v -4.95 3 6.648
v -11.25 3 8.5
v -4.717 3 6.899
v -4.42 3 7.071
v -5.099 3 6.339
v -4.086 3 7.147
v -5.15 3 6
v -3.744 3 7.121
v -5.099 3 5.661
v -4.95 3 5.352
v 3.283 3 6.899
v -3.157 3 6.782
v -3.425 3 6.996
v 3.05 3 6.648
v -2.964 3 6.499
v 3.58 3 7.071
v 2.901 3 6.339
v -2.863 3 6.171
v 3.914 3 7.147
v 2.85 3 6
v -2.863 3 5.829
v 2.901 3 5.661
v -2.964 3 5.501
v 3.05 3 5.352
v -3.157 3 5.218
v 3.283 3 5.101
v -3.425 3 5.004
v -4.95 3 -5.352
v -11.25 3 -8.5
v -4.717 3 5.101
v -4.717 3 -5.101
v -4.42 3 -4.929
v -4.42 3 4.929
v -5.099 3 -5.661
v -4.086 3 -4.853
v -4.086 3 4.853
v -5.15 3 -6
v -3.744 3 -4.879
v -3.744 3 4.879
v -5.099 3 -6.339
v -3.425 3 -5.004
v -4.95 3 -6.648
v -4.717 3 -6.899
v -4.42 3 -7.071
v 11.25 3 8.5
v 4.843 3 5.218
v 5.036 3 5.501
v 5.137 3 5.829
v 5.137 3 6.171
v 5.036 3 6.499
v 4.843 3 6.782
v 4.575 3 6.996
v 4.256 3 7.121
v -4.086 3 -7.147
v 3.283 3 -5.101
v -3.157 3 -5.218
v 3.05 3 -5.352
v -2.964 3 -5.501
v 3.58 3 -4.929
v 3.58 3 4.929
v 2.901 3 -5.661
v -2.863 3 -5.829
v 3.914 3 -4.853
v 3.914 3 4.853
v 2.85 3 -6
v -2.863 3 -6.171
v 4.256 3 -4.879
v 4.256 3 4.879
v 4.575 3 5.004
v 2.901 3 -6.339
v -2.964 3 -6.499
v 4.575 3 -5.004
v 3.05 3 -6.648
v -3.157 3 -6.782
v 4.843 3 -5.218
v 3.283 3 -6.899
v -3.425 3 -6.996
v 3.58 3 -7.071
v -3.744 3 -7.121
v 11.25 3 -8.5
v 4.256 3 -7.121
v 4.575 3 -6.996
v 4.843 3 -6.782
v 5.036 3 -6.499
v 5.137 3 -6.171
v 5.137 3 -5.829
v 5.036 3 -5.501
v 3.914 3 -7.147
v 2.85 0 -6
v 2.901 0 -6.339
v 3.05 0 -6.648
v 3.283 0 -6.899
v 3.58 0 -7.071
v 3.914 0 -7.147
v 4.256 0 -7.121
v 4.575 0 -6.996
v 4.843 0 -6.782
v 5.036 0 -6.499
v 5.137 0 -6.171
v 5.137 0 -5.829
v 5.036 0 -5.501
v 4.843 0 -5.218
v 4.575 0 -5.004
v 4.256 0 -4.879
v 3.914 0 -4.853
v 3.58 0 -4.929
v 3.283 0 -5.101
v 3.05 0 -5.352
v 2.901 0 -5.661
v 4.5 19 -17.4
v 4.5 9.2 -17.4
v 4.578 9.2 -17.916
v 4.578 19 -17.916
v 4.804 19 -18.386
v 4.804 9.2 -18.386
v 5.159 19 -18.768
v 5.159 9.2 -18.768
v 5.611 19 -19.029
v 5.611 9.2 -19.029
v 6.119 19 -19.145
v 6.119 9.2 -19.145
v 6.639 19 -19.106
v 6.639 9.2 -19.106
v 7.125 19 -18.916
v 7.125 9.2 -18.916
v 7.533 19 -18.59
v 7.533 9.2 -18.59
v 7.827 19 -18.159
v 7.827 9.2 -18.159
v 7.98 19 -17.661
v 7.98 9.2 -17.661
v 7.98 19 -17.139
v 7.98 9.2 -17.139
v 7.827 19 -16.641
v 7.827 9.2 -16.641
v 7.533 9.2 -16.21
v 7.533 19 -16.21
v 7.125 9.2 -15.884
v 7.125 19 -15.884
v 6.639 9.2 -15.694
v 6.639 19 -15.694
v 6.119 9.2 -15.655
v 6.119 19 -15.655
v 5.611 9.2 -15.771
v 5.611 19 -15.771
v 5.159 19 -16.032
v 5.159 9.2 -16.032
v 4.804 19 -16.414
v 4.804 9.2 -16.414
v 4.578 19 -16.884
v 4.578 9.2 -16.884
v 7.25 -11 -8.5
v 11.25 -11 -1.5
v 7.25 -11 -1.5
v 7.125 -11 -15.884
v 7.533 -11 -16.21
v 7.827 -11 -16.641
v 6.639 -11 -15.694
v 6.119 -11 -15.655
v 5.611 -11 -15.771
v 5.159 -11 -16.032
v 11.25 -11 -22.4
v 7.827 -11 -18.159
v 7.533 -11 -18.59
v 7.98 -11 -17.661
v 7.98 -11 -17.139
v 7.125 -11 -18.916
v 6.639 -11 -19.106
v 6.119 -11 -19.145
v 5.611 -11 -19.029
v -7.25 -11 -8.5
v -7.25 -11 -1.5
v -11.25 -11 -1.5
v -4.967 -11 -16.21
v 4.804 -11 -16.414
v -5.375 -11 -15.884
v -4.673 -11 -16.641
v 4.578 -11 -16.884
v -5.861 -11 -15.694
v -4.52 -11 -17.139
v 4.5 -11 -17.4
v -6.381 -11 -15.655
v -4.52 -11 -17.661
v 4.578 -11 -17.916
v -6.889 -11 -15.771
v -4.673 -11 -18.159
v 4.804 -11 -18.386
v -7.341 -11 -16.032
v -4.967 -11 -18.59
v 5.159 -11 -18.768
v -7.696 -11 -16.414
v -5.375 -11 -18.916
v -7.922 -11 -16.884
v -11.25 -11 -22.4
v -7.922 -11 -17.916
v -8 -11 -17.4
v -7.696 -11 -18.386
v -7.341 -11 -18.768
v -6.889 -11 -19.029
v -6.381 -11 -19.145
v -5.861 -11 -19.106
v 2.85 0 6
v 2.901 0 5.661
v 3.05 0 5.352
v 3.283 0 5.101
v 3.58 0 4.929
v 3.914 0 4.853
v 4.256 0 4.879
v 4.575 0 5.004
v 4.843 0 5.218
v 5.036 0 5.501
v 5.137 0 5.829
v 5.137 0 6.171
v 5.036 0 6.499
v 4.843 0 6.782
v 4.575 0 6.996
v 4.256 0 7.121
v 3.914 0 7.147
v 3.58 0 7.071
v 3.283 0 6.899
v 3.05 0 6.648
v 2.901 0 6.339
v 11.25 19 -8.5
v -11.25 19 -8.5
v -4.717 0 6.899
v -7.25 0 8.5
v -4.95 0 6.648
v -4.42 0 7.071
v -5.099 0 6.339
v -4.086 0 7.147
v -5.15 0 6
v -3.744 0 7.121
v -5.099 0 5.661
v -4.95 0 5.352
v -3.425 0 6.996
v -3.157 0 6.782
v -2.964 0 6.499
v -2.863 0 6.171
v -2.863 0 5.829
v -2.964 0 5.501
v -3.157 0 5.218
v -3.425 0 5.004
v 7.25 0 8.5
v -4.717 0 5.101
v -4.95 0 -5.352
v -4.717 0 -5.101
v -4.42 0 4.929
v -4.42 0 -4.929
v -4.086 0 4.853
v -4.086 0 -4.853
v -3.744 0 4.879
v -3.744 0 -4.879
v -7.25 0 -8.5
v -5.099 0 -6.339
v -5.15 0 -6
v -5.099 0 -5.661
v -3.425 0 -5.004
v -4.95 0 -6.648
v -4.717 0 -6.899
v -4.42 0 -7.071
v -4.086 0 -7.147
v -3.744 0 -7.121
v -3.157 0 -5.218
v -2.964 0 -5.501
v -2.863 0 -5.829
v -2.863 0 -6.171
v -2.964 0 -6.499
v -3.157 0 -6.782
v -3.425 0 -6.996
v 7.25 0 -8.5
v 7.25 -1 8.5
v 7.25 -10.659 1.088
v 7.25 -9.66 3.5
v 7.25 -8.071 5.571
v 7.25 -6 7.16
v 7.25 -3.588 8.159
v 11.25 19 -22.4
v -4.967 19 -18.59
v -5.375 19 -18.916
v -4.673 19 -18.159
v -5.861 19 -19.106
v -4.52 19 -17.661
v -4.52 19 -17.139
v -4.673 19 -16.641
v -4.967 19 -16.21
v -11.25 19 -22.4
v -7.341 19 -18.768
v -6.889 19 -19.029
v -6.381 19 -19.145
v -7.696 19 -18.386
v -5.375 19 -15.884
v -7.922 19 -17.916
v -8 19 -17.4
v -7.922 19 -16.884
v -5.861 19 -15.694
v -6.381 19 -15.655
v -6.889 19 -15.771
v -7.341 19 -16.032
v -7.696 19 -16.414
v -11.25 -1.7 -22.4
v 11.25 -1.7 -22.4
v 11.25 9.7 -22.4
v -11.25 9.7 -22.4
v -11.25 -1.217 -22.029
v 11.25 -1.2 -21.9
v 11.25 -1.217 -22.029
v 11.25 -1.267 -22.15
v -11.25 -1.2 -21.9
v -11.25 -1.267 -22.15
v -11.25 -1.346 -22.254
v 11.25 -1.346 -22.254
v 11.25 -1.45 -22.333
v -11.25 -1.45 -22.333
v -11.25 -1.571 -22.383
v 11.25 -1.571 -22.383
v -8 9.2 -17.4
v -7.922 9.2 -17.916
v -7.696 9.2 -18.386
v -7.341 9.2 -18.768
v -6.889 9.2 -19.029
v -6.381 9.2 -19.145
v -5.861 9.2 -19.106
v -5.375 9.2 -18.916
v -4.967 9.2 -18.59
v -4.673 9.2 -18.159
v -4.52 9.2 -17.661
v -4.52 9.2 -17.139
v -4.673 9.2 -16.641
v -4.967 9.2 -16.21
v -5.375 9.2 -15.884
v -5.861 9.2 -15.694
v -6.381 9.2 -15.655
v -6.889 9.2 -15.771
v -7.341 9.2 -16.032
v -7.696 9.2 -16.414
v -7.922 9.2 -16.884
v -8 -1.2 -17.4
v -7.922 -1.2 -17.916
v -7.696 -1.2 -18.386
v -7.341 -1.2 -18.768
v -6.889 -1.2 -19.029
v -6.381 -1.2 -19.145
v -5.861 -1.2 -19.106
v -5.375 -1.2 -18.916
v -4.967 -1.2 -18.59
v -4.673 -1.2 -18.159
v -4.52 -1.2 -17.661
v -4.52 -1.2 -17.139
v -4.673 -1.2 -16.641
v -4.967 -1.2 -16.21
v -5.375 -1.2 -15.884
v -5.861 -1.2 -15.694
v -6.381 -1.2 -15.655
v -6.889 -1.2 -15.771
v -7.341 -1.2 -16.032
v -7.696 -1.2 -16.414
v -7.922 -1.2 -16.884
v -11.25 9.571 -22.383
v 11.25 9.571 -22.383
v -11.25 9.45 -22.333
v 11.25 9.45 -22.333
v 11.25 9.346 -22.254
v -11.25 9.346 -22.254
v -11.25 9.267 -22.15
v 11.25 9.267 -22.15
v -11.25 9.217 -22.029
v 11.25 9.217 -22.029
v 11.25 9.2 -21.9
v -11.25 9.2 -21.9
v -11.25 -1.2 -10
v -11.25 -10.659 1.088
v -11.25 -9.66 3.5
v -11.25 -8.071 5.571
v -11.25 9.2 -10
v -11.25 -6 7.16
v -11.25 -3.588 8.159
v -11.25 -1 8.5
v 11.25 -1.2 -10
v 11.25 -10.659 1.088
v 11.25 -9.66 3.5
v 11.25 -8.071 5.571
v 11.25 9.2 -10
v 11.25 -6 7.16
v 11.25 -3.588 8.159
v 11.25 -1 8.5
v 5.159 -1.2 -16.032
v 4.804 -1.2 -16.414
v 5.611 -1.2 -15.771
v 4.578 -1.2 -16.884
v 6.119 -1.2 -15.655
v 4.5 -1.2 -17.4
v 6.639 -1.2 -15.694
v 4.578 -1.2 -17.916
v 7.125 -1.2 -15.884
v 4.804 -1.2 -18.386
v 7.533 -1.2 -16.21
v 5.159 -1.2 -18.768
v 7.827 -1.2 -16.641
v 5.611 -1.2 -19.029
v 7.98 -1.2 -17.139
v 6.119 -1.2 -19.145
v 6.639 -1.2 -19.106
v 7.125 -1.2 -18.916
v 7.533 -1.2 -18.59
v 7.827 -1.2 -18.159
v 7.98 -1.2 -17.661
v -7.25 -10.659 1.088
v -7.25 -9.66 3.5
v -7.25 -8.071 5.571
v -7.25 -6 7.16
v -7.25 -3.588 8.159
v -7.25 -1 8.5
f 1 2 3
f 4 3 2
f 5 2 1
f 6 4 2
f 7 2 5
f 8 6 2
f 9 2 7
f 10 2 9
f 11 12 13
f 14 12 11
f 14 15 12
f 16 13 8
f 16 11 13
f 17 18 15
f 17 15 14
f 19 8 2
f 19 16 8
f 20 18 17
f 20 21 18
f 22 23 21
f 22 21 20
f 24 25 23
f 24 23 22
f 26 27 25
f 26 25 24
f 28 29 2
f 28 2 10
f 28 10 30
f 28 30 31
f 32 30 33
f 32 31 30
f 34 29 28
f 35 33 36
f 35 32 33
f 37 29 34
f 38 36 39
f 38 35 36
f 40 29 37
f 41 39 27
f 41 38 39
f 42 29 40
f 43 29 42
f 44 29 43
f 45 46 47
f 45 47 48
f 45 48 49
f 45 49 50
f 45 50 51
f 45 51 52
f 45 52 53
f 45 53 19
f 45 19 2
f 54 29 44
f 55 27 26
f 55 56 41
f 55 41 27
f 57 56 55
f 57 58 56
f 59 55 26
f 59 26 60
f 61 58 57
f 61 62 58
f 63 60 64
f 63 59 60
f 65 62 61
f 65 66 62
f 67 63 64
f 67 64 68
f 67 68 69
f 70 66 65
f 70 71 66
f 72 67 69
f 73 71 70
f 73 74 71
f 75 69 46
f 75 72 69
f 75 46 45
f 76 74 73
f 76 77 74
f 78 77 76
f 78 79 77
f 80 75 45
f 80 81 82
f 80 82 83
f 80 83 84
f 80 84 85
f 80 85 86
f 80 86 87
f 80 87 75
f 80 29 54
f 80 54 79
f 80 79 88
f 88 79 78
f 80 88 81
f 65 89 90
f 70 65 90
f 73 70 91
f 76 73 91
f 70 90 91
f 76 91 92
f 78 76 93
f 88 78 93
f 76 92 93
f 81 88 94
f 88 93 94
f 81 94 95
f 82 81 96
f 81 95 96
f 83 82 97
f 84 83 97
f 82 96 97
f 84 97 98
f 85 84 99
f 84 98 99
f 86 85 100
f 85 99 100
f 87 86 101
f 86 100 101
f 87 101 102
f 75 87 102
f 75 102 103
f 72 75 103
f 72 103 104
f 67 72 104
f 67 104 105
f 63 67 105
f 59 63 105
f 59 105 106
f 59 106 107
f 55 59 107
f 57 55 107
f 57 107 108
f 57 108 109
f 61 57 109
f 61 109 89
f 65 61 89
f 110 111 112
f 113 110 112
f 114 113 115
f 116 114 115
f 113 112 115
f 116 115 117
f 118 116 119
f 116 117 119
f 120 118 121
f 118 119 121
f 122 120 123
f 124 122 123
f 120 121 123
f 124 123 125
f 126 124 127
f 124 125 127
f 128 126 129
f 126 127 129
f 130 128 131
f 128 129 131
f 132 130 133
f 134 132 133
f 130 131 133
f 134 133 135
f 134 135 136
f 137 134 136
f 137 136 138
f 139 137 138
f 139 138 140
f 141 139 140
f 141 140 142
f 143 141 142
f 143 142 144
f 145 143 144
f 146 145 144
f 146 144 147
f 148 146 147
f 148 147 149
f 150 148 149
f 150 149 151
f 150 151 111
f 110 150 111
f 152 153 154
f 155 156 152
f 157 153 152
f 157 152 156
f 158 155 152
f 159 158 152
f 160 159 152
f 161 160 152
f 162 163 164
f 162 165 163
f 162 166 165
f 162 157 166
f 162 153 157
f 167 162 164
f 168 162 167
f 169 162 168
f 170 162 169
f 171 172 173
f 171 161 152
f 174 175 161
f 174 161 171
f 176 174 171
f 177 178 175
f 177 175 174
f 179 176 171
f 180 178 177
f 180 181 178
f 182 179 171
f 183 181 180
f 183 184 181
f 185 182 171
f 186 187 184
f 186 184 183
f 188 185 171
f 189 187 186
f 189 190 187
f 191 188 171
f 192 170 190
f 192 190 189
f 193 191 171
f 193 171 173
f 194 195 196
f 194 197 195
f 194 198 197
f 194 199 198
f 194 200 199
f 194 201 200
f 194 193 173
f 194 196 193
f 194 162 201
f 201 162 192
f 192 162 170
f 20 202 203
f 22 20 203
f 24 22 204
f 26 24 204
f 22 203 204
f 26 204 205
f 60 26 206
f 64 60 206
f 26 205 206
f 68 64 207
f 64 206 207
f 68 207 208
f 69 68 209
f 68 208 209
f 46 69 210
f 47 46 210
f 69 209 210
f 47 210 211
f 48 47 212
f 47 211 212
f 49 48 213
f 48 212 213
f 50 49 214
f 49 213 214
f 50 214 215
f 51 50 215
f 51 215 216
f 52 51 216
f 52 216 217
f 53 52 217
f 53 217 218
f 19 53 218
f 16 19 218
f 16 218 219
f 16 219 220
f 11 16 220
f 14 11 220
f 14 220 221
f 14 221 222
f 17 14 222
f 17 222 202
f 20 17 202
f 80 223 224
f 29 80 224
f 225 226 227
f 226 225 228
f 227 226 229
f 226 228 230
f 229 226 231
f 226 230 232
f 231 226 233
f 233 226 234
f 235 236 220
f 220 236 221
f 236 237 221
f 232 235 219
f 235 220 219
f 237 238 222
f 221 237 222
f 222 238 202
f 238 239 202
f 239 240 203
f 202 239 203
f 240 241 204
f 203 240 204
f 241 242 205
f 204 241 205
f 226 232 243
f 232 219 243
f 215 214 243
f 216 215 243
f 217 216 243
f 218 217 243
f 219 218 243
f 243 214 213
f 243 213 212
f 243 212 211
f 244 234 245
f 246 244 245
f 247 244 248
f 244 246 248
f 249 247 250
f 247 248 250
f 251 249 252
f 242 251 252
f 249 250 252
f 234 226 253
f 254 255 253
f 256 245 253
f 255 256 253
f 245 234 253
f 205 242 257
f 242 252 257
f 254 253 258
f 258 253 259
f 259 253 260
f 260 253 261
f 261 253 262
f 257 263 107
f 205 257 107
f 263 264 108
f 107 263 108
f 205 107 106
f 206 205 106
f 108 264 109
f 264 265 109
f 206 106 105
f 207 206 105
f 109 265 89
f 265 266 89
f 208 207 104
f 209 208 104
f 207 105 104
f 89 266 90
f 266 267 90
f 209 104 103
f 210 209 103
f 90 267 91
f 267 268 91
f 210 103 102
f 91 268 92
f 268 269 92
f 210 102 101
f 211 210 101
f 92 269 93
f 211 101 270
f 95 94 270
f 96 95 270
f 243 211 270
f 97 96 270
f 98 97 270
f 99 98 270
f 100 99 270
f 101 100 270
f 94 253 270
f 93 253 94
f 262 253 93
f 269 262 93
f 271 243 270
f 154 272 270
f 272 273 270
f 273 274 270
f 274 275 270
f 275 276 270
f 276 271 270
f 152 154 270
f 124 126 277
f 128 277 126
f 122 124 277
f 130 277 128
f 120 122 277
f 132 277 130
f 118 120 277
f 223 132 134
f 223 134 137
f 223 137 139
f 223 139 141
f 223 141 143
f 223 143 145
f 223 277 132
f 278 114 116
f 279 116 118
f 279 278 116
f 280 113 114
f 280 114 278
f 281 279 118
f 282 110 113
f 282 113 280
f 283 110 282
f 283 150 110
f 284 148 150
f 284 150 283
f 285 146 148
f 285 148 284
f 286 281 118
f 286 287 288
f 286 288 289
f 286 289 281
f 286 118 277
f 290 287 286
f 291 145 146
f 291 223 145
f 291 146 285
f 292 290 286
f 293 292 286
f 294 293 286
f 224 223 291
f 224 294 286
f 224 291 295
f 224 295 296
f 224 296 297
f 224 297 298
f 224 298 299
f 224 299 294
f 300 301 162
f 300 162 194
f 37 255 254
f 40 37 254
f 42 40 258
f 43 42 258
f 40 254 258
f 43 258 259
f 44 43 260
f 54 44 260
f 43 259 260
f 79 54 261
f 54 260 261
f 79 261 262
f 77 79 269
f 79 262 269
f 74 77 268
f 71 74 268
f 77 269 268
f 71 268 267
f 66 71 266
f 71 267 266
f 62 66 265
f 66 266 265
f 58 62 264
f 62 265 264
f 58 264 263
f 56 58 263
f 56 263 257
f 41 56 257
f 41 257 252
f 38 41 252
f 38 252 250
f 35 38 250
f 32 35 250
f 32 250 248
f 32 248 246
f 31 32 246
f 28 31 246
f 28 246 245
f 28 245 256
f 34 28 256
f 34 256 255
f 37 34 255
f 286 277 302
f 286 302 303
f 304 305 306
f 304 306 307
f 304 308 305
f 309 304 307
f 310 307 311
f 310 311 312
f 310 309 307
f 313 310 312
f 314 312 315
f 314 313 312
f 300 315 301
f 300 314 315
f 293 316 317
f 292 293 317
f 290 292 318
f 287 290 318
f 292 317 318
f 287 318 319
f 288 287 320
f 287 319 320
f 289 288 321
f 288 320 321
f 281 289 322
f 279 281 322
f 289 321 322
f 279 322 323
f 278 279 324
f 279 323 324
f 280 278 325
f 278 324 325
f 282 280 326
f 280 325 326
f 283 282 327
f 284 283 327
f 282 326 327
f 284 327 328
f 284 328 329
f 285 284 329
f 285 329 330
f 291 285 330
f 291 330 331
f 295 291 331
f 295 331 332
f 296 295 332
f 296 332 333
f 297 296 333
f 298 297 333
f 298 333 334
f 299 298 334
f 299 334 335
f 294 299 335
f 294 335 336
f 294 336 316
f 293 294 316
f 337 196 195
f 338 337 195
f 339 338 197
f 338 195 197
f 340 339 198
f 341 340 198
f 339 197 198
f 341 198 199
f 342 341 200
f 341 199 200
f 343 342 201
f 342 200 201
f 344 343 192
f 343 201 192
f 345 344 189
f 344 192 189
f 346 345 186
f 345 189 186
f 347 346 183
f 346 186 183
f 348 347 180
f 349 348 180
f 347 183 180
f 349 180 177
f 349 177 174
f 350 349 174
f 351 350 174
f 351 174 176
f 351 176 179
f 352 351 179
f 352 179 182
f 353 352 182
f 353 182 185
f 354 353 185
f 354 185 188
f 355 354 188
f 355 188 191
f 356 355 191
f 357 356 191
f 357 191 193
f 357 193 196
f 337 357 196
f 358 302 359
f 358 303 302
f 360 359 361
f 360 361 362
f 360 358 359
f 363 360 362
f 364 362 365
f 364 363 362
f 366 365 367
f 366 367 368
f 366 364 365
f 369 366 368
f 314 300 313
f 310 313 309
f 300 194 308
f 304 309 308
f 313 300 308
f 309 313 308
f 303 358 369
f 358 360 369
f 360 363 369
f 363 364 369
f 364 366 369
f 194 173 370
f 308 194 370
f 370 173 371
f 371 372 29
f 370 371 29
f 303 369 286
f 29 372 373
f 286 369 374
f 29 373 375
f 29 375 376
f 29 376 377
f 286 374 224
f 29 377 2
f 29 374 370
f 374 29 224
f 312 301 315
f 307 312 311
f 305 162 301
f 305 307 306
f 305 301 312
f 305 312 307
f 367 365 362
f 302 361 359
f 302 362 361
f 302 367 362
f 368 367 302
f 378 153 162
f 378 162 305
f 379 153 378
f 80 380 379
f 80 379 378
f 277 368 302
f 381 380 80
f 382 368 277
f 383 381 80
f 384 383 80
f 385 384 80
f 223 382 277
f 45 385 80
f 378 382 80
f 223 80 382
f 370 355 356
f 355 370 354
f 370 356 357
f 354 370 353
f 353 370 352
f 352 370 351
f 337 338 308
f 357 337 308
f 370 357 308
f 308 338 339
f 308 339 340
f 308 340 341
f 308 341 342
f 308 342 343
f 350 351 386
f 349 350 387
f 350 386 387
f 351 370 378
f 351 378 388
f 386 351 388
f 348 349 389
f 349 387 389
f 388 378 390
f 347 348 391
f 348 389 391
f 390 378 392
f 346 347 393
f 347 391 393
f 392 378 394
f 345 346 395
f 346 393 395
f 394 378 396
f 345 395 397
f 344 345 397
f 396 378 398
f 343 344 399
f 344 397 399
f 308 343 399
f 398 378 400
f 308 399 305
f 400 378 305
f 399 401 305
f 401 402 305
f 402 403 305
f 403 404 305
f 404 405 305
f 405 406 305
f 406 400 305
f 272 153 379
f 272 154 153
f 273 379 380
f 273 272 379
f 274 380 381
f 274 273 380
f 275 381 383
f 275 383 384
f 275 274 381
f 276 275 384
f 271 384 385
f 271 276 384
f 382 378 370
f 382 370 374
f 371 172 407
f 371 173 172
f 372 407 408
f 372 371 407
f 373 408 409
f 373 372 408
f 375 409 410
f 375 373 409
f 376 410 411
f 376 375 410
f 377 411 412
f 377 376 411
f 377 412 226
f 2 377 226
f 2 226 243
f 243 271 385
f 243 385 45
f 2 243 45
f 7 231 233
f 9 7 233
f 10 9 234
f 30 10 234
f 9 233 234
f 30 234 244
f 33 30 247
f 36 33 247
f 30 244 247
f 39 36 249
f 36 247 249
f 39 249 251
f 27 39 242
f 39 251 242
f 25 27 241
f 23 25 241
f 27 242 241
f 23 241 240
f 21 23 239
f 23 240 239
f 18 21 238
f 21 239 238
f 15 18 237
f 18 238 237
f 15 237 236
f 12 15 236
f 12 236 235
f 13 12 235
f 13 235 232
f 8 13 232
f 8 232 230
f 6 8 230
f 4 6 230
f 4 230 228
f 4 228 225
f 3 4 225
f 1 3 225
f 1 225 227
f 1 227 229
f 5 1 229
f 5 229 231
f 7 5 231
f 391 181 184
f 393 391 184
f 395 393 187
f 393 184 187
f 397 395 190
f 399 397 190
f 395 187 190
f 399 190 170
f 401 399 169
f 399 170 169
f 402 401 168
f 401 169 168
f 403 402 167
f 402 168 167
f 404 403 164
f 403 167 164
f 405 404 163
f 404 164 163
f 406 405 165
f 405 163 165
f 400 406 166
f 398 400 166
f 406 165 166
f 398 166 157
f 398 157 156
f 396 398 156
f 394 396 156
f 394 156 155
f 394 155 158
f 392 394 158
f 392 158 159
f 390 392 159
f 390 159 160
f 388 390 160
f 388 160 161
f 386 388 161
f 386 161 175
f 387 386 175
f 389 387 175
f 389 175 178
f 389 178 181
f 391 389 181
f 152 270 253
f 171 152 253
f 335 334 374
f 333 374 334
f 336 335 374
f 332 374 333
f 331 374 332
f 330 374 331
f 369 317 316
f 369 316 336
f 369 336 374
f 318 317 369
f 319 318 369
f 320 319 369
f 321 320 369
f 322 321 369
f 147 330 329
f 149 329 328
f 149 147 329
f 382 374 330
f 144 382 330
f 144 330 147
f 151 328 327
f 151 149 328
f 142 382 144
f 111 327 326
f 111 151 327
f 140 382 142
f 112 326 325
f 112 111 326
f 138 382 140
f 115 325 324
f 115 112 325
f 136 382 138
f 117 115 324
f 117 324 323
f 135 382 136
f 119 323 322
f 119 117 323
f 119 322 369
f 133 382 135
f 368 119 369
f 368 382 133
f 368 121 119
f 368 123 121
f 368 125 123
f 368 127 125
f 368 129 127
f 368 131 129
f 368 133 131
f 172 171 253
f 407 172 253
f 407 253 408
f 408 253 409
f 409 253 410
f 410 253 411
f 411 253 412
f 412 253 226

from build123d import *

# Parameters (mm, degrees)
SKETCH_1_W          = 22.5
SKETCH_1_H          = 17
EXTRUDE_1_DEPTH     = 3
HOLE_WIZARD_1_D     = 2.3
SKETCH_5_W          = 22.5
SKETCH_5_H          = 4
SKETCH_5_H_2        = 3
EXTRUDE_2_DEPTH     = 1.5
SKETCH_8_W          = 22.5
SKETCH_8_H          = 10
EXTRUDE_3_DEPTH     = 1.5
SKETCH_9_W          = 17
SKETCH_9_H          = 14
EXTRUDE_4_DEPTH     = 4
SKETCH_10_W         = 17
SKETCH_10_H         = 14
EXTRUDE_5_DEPTH     = 4
SKETCH_11_W         = 22.5
SKETCH_11_H         = 11
EXTRUDE_6_DEPTH     = 1.5
HOLE_WIZARD_3_D     = 3.3
SKETCH_18_W         = 22.5
SKETCH_18_H         = 10
EXTRUDE_7_DEPTH     = 2.4
SKETCH_21_W         = 22.5
SKETCH_21_H         = 3
EXTRUDE_8_DEPTH     = 2.4
SKETCH_22_W         = 22.5
SKETCH_22_H         = 8
EXTRUDE_9_DEPTH     = 2.4
SKETCH_25_W         = 22.5
SKETCH_25_H         = 8
SKETCH_25_H_2       = 3
CUT_EXTRUDE_1_DEPTH = 36.949582751
SKETCH_26_W         = 22.5
SKETCH_26_H         = 10
EXTRUDE_10_DEPTH    = 10
FILLET_1_R          = 10
HOLE_WIZARD_4_D     = 3.5
SKETCH_30_W         = 12.4
SKETCH_30_H         = 0.2
CUT_EXTRUDE_2_DEPTH = 38.000135135
FILLET_3_R          = 0.5


with BuildPart() as part:
    # 草图1 → 凸台-拉伸1 (new body)
    with BuildSketch(Plane(origin=(0, 0, 0), x_dir=(1, 0, 0), z_dir=(0, 1, 0))):
        Rectangle(SKETCH_1_W, SKETCH_1_H)
    extrude(amount=EXTRUDE_1_DEPTH)

    # 孔1 (through all)
    with Locations(Plane(origin=(0, 3, 0), x_dir=(1, 0, 0), z_dir=(0, 1, 0))):
        with Locations((-4, 6), (4, 6), (-4, -6), (4, -6)):
            Hole(HOLE_WIZARD_1_D / 2)

    # 草图5 → 凸台-拉伸2 (add)
    with BuildSketch(Plane(origin=(0, 0, -8.5), x_dir=(-1, 0, 0), z_dir=(0, 0, -1))):
        with Locations((0, -2)):
            Rectangle(SKETCH_5_W, SKETCH_5_H)
        with Locations((0, 1.5)):
            Rectangle(SKETCH_5_W, SKETCH_5_H_2)
        with Locations((0, 4.5)):
            Rectangle(SKETCH_5_W, SKETCH_5_H_2)
    extrude(amount=EXTRUDE_2_DEPTH)

    # 草图8 → 凸台-拉伸3 (add)
    with BuildSketch(Plane(origin=(0, 0, -10), x_dir=(-1, 0, 0), z_dir=(0, 0, -1))):
        with Locations((0, -9)):
            Rectangle(SKETCH_8_W, SKETCH_8_H)
        with Locations((0, 11)):
            Rectangle(SKETCH_8_W, SKETCH_8_H)
    extrude(amount=-EXTRUDE_3_DEPTH)

    # 草图9 → 凸台-拉伸4 (add)
    with BuildSketch(Plane.ZY.offset(11.25)):
        with Locations((0, -7)):
            Rectangle(SKETCH_9_W, SKETCH_9_H)
    extrude(amount=-EXTRUDE_4_DEPTH)

    # 草图10 → 凸台-拉伸5 (add)
    with BuildSketch(Plane(origin=(11.25, 0, 0), x_dir=(0, 0, -1), z_dir=(1, 0, 0))):
        with Locations((0, -7)):
            Rectangle(SKETCH_10_W, SKETCH_10_H)
    extrude(amount=-EXTRUDE_5_DEPTH)

    # 草图11 → 凸台-拉伸6 (add)
    with BuildSketch(Plane(origin=(0, 0, -10), x_dir=(-1, 0, 0), z_dir=(0, 0, -1))):
        with Locations((0, 21.5)):
            Rectangle(SKETCH_11_W, SKETCH_11_H)
    extrude(amount=-EXTRUDE_6_DEPTH)

    # 孔3 (through all)
    with Locations(Plane(origin=(0, 0, -10), x_dir=(-1, 0, 0), z_dir=(0, 0, -1))):
        with Locations((-7.25, 22), (7.25, 22)):
            Hole(HOLE_WIZARD_3_D / 2)

    # 草图18 → 凸台-拉伸7 (add)
    with BuildSketch(Plane(origin=(0, 0, -10), x_dir=(-1, 0, 0), z_dir=(0, 0, -1))):
        with Locations((0, -9)):
            Rectangle(SKETCH_18_W, SKETCH_18_H)
        with Locations((0, 22)):
            Rectangle(SKETCH_18_W, SKETCH_18_H)
    extrude(amount=EXTRUDE_7_DEPTH)

    # 草图21 → 凸台-拉伸8 (add)
    with BuildSketch(Plane(origin=(0, 0, -10), x_dir=(-1, 0, 0), z_dir=(0, 0, -1))):
        with Locations((0, -2.5)):
            Rectangle(SKETCH_21_W, SKETCH_21_H)
    extrude(amount=EXTRUDE_8_DEPTH)

    # 草图22 → 凸台-拉伸9 (add)
    with BuildSketch(Plane(origin=(0, 0, -10), x_dir=(-1, 0, 0), z_dir=(0, 0, -1))):
        with Locations((0, 13)):
            Rectangle(SKETCH_22_W, SKETCH_22_H)
    extrude(amount=EXTRUDE_9_DEPTH)

    # 草图25 → 切除-拉伸1 (cut, through all)
    with BuildSketch(Plane(origin=(0, 0, -12.4), x_dir=(-1, 0, 0), z_dir=(0, 0, -1))):
        with Locations((0, 23)):
            Rectangle(SKETCH_25_W, SKETCH_25_H)
        with Locations((0, -12.5)):
            Rectangle(SKETCH_25_W, SKETCH_25_H_2)
    extrude(amount=-CUT_EXTRUDE_1_DEPTH, mode=Mode.SUBTRACT)

    # 草图26 → 凸台-拉伸10 (add)
    with BuildSketch(Plane(origin=(0, 0, -12.4), x_dir=(-1, 0, 0), z_dir=(0, 0, -1))):
        with Locations((0, 14)):
            Rectangle(SKETCH_26_W, SKETCH_26_H)
        with Locations((0, -6)):
            Rectangle(SKETCH_26_W, SKETCH_26_H)
    extrude(amount=EXTRUDE_10_DEPTH)

    # 圆角1
    fillet_1_edges = [part.edges().sort_by_distance(p)[0] for p in [
        (-9.25, -11, 8.5),
        (9.25, -11, 8.5),
    ]]
    fillet(fillet_1_edges, radius=FILLET_1_R)

    # 孔4 (through all)
    with Locations(Plane(origin=(0, 19, 0), x_dir=(1, 0, 0), z_dir=(0, 1, 0))):
        with Locations((-6.25, 17.4), (6.25, 17.4)):
            Hole(HOLE_WIZARD_4_D / 2)

    # 草图30 → 切除-拉伸2 (cut, through all)
    with BuildSketch(Plane(origin=(11.25, 0, 0), x_dir=(0, 0, -1), z_dir=(1, 0, 0))):
        with Locations((16.2, 9.1)):
            Rectangle(SKETCH_30_W, SKETCH_30_H)
        with Locations((16.2, -1.1)):
            Rectangle(SKETCH_30_W, SKETCH_30_H)
    extrude(amount=-CUT_EXTRUDE_2_DEPTH, mode=Mode.SUBTRACT)

    # 圆角3
    fillet_3_edges = [part.edges().sort_by_distance(p)[0] for p in [
        (0, 9.2, -22.4),
        (0, -1.2, -22.4),
    ]]
    fillet(fillet_3_edges, radius=FILLET_3_R)


solid = part.part
